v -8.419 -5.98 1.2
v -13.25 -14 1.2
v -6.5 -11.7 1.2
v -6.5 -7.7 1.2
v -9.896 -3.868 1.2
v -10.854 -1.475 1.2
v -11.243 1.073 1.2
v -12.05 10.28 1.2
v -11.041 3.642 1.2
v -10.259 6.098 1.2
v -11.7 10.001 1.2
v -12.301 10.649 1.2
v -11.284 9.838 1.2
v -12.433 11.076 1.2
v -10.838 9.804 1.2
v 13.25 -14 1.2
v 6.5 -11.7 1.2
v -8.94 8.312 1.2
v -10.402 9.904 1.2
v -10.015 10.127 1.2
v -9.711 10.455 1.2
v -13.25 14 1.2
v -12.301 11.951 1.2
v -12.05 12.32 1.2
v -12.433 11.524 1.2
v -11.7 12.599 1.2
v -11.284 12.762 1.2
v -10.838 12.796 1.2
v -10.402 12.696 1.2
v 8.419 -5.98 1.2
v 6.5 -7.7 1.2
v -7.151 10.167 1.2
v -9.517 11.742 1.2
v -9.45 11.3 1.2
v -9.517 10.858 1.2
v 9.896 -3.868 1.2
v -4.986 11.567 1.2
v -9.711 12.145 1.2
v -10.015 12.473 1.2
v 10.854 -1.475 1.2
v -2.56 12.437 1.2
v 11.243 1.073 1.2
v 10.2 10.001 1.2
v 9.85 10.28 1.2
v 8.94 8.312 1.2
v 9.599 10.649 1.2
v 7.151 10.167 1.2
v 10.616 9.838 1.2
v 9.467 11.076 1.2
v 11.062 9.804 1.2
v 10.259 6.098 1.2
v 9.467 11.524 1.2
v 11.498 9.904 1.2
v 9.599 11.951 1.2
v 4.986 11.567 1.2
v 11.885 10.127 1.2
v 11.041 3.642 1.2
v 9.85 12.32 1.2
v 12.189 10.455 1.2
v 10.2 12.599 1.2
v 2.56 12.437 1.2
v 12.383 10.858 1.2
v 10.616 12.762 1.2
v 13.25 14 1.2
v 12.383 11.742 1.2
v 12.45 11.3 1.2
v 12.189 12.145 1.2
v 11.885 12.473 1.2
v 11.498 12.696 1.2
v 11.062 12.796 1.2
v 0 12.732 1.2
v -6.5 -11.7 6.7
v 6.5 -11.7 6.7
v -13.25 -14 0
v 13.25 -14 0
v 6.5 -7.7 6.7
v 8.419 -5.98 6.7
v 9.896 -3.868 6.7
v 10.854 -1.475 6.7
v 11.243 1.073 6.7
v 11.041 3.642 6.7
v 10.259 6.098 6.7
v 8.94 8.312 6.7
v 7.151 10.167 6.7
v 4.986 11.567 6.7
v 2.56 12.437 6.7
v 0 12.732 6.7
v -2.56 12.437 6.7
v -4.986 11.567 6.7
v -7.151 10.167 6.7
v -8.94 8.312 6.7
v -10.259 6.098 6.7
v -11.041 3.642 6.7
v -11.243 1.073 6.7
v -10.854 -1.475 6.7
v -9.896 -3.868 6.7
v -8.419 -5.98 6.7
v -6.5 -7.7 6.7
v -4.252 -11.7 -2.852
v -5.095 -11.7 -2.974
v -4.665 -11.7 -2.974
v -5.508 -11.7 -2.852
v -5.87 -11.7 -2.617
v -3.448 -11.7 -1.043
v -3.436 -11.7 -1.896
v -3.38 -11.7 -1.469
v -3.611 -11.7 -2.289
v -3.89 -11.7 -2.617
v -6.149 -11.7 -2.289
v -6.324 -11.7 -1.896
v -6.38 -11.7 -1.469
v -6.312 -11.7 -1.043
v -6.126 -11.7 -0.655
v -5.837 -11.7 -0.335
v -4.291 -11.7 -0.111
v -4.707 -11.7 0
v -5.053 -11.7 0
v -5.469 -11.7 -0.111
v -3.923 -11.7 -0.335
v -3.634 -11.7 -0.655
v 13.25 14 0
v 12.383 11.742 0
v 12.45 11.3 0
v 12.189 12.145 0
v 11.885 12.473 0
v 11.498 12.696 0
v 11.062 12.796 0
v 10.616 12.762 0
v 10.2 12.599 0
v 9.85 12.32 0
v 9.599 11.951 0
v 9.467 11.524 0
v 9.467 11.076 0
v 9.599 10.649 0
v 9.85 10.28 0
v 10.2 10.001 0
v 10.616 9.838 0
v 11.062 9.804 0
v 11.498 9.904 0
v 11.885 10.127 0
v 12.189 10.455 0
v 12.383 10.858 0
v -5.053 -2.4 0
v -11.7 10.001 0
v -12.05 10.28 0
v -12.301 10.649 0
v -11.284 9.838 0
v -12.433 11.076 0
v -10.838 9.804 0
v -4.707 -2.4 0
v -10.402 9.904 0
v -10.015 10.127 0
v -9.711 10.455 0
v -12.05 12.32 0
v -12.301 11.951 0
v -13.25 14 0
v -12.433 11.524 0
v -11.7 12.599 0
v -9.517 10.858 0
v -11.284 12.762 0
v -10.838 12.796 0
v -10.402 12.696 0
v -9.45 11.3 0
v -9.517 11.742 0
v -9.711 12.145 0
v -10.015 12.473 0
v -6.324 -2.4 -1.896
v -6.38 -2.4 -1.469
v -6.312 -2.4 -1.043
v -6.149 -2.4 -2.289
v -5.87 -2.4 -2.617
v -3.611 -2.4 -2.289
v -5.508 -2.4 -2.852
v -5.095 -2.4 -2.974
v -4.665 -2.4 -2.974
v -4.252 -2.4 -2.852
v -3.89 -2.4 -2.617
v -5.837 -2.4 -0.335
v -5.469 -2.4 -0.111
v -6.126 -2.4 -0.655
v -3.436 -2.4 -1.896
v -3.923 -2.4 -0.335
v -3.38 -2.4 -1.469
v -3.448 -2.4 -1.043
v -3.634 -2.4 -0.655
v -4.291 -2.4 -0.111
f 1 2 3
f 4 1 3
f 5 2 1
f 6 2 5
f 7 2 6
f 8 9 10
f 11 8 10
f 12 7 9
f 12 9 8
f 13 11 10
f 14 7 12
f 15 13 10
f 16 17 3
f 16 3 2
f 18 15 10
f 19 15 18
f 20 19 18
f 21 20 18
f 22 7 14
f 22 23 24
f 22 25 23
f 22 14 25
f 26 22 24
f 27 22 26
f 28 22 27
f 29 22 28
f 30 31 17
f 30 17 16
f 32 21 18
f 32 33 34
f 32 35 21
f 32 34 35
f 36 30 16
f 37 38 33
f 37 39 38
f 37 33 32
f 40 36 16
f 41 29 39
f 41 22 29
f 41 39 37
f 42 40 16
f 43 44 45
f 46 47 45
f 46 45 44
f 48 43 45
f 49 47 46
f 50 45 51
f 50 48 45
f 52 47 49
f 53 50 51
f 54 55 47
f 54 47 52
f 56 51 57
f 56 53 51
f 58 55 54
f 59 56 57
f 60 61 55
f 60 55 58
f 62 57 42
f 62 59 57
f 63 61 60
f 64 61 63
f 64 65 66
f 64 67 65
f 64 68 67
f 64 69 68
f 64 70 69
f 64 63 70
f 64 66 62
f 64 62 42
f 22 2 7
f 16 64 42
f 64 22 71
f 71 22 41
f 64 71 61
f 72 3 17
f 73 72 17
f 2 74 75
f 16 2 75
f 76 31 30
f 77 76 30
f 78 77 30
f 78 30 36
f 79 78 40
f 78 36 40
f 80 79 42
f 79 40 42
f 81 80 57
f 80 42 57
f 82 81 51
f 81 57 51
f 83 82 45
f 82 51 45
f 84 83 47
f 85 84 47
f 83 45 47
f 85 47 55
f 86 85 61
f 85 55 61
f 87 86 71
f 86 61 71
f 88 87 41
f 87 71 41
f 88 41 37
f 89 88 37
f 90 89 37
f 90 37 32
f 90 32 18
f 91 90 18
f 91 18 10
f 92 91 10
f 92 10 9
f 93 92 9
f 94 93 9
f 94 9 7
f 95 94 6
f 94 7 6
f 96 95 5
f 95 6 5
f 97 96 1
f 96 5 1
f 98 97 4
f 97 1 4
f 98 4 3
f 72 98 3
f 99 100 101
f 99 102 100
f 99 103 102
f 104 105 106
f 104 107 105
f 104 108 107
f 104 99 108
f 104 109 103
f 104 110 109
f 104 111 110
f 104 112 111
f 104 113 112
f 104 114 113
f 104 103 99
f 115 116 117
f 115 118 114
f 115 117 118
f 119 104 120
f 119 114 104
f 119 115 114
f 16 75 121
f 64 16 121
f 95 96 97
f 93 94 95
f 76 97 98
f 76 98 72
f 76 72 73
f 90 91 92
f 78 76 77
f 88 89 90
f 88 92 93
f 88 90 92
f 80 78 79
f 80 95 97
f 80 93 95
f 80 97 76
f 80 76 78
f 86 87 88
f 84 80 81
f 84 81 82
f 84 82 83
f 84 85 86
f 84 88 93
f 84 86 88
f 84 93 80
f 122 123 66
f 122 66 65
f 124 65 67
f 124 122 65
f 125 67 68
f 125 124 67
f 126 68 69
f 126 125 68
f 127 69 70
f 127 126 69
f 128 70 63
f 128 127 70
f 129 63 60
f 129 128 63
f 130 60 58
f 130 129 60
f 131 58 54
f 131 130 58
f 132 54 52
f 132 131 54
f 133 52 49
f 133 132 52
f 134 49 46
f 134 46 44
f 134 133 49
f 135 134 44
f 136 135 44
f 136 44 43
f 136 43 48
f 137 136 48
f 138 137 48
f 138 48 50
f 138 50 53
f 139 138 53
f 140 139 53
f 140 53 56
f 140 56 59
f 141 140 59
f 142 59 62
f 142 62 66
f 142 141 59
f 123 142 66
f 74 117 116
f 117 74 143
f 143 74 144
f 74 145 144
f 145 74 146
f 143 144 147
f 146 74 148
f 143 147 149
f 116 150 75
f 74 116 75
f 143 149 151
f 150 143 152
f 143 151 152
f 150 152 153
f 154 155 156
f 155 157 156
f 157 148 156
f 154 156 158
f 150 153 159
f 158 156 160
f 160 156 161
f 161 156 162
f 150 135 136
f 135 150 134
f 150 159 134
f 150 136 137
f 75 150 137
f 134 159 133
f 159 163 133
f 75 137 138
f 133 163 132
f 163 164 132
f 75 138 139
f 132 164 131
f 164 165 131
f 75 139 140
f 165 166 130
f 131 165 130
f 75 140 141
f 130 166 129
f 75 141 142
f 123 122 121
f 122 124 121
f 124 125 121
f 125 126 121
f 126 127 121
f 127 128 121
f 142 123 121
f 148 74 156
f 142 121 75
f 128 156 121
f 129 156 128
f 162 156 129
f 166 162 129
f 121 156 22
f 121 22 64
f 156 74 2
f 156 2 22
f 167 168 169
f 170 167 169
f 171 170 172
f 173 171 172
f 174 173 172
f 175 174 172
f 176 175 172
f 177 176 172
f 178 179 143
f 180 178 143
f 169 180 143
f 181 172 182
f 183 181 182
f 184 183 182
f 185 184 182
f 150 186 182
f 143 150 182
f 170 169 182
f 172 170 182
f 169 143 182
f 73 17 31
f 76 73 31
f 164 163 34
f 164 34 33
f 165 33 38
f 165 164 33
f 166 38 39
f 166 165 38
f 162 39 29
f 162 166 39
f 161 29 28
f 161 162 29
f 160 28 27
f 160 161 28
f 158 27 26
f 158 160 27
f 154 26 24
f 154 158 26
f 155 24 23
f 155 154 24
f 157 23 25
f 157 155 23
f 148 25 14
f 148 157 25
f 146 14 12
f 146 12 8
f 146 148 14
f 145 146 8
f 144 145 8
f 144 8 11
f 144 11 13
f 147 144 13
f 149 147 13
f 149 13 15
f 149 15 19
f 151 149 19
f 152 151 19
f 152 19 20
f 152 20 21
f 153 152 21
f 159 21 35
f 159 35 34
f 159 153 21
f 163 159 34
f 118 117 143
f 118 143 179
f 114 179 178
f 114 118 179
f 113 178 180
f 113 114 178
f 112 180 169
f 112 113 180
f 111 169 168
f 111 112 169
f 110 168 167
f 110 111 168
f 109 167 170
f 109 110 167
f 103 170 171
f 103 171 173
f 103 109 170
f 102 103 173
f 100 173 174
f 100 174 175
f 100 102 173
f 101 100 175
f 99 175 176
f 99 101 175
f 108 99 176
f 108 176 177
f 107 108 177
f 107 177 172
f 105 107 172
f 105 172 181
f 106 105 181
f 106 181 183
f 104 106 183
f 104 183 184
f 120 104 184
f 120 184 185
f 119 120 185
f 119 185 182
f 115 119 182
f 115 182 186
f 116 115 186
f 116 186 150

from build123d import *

# Parameters (mm, degrees)
F0_W     = 26.5
F0_H     = 28
F0_R     = 1.5
F1_DEPTH = 1.2
F3_DEPTH = 5.5
F4_R     = 1.5
F5_DEPTH = 9.3


with BuildPart() as f1:
    # F0 (on Top) → F1 (new body)
    with BuildSketch(Plane.XY):
        Rectangle(F0_W, F0_H)
        with Locations((-10.95, 11.3)):
            Circle(F0_R, mode=Mode.SUBTRACT)
        with Locations((10.95, 11.3)):
            Circle(F0_R, mode=Mode.SUBTRACT)
    extrude(amount=F1_DEPTH)

    # F2 (on face) → F3 (join)
    with BuildSketch(Plane.XY.offset(1.2)):
        with BuildLine():
            Line((6.5, -11.7), (6.5, -7.7))
            ThreePointArc((6.5, -7.7), (0, 12.7321838361), (-6.5, -7.7))
            Line((-6.5, -7.7), (-6.5, -11.7))
            Line((-6.5, -11.7), (6.5, -11.7))
        make_face()
    extrude(amount=F3_DEPTH)

    # F4 (on face) → F5 (join)
    with BuildSketch(Plane.XZ.offset(11.7)):
        with Locations((-4.8800413497, -1.49)):
            Circle(F4_R)
    extrude(amount=-F5_DEPTH)


solid = f1.part
